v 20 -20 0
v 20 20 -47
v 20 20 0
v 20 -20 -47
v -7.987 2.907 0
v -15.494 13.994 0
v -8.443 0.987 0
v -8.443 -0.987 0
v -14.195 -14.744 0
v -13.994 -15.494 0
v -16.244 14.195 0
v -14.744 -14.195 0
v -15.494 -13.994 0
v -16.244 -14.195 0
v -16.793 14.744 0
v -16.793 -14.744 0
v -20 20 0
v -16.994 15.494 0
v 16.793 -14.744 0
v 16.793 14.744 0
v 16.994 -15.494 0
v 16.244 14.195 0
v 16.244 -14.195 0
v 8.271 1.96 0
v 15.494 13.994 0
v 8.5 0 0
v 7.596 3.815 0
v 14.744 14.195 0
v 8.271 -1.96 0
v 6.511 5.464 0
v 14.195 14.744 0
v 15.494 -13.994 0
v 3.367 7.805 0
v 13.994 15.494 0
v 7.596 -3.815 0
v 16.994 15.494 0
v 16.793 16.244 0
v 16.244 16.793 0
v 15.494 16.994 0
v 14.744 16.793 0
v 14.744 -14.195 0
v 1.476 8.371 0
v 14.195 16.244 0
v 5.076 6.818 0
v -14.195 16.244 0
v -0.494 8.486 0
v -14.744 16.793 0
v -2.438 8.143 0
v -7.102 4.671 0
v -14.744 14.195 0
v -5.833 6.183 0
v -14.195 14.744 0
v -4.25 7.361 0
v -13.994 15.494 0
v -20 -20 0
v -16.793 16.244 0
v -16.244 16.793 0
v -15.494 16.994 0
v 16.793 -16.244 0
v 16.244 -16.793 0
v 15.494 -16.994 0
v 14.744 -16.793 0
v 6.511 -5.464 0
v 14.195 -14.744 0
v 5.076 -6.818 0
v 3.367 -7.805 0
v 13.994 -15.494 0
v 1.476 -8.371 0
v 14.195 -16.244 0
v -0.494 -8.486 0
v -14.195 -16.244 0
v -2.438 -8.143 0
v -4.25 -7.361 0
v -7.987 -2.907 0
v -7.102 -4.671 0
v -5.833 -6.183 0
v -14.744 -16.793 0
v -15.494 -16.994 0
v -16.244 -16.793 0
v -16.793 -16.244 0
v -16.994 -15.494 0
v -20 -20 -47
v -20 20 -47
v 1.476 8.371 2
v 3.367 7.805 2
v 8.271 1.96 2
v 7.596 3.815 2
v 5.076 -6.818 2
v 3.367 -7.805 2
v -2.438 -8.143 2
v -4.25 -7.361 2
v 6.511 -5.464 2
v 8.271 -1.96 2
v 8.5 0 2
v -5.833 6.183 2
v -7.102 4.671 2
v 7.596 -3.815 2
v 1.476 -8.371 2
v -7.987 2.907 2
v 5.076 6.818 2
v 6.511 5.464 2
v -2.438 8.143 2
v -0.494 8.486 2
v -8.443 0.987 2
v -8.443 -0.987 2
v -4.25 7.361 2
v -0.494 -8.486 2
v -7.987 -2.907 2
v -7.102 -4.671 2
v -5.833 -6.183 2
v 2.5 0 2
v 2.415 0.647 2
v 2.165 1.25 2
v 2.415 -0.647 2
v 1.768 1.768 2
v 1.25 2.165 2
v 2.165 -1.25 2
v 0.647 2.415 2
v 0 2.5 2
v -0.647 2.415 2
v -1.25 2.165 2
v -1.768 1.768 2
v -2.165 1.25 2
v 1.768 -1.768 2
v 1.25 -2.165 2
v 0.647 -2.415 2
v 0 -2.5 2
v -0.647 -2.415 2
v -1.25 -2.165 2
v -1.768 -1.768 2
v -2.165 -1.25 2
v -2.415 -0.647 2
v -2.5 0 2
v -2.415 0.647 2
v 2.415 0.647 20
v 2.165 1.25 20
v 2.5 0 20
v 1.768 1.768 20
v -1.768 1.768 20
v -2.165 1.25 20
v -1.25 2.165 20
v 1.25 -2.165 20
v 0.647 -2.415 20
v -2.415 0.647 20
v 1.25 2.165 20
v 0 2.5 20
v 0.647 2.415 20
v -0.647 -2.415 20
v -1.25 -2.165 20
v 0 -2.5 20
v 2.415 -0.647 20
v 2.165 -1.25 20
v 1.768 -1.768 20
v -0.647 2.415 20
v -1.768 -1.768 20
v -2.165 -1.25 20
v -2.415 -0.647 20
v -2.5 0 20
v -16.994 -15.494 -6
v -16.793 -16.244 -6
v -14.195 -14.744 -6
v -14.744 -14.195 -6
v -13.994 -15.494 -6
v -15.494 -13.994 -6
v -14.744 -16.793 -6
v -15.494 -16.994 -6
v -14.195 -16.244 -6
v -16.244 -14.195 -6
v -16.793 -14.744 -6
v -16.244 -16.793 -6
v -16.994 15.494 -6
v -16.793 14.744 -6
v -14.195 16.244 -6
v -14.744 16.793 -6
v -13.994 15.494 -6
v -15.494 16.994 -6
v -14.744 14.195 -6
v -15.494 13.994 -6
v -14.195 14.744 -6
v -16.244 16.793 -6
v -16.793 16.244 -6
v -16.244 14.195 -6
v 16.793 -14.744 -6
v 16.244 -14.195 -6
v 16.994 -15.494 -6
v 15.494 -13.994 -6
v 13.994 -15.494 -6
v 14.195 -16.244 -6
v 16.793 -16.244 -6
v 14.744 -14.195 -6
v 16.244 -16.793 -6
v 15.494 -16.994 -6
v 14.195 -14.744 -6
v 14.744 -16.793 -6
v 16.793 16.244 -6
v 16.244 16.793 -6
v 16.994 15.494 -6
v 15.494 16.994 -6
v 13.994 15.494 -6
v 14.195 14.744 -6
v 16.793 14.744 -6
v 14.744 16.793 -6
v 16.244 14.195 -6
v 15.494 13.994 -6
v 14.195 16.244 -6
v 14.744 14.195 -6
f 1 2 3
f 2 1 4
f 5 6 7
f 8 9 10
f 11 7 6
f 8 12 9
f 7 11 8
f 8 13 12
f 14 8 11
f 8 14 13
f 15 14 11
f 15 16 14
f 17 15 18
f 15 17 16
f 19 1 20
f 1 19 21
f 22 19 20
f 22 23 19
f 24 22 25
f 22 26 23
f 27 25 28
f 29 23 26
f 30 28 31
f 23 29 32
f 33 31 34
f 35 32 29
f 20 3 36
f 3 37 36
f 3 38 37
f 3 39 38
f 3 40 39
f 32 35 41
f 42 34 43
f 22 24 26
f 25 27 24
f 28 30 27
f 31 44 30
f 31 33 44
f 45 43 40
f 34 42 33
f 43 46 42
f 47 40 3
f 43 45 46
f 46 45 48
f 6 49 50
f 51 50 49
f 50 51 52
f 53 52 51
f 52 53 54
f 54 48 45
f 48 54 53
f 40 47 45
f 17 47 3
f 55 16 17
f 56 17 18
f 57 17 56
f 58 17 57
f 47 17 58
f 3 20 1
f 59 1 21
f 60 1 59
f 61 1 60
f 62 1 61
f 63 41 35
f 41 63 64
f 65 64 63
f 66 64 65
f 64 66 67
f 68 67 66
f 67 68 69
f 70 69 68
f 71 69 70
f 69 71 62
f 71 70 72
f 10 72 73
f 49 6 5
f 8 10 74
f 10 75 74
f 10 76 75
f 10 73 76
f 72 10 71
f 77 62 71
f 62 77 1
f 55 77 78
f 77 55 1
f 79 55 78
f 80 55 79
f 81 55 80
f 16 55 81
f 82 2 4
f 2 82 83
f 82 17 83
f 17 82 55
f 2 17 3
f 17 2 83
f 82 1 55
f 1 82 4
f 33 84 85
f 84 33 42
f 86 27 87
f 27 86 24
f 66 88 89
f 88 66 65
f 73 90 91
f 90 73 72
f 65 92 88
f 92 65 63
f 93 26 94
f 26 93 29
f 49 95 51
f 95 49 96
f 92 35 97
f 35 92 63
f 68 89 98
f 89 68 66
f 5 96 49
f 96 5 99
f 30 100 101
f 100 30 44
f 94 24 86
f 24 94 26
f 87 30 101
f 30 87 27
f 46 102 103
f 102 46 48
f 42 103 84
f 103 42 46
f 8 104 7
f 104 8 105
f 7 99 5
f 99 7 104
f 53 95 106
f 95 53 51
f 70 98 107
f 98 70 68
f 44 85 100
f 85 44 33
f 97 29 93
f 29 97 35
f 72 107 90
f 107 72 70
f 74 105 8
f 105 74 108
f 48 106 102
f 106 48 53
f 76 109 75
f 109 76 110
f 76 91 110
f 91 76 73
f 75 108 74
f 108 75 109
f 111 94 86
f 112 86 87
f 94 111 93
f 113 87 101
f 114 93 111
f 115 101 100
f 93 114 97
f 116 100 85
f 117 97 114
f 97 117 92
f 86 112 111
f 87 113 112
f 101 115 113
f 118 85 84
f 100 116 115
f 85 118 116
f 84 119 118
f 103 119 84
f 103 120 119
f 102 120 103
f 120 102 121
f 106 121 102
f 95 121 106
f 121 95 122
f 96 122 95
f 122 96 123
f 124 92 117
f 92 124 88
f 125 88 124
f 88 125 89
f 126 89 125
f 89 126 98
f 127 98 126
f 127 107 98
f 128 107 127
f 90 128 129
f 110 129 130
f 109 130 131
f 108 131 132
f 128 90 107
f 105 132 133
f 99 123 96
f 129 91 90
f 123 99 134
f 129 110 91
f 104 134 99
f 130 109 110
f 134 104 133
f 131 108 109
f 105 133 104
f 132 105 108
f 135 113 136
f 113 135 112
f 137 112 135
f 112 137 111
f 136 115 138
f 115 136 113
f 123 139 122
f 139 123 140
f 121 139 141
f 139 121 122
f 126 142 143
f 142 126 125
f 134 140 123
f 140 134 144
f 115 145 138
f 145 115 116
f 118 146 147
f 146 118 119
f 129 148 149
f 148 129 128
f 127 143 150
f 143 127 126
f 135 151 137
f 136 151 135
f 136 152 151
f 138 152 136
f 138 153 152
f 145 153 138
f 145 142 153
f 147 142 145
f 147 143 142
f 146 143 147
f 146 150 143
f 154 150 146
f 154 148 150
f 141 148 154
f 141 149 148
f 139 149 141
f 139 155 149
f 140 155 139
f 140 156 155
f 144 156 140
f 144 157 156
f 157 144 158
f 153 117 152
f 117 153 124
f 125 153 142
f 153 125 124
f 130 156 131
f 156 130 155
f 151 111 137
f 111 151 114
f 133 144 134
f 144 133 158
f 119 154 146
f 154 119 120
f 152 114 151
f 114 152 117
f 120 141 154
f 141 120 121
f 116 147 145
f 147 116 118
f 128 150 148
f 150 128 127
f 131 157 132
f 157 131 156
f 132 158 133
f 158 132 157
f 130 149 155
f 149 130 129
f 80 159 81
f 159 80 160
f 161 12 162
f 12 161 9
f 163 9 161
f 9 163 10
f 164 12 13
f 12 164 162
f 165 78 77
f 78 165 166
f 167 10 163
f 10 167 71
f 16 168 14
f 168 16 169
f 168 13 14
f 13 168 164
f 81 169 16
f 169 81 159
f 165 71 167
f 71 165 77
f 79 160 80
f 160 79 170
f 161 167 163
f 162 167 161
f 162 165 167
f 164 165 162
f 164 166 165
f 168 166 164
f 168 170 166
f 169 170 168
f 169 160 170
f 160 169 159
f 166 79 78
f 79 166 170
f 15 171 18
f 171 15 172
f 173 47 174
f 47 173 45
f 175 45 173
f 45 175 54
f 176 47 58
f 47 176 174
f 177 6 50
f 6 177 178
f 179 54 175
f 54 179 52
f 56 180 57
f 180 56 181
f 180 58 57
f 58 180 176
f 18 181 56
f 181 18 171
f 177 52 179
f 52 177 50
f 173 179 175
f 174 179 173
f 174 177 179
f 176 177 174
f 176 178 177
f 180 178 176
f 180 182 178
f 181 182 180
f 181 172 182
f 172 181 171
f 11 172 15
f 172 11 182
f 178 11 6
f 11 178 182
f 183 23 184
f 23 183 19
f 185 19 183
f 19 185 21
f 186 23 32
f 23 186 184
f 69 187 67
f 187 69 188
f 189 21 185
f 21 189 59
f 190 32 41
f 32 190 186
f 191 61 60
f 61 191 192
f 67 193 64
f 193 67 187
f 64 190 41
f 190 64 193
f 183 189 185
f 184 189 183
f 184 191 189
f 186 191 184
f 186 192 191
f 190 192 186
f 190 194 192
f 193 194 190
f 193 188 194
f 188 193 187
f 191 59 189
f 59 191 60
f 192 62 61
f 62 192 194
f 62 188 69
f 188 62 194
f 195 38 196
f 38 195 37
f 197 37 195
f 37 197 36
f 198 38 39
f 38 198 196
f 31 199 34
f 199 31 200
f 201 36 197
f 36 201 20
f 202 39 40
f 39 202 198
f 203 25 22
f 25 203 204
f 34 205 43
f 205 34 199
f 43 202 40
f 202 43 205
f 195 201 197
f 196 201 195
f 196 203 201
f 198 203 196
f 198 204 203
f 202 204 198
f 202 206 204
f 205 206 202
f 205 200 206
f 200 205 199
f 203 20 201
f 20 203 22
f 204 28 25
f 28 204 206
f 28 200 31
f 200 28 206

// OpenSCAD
// file: configuration.scad
//
//	configuration.scad
//
//	General configuration settings.
//
//	Because this file is intended to be somewhat interchangable with 
//		configuration.scad from prusajr's github repository, there is 
//		more configuration in "moreConfiguration.scad".
//
// Edit variant to match the types of nuts and bolts you want to use in your part.
//
//	Edit layer_height to be greater than the height of one printed layer, 
//		but less than the height of two printed layers.
//


metric = 0;	// All parts are metric - use both M3 and M4 bolts.
sae = 1;		// All parts are SAE - use only #6/32 bolts.
m3only = 2;	// All parts are metric, but use only M3 bolts.
hybrid = 3;	// Mix of metric and SAE - use M3 and 6/32 bolts.

variant = metric;

layer_height = .25;

nut_slop = .2;		// I aim for a "interference fit" for nuts - a bit of force required to place the nut.

bolt_slop = .6;	// The aim here is to just barely allow the bolt to fit through the hole, without having to thread it in.

_actual_m3_diameter = 3+bolt_slop;
_actual_m4_diameter = 4+bolt_slop;
_actual_6_32_diameter = 3.4+bolt_slop;

_actual_m3_nut_diameter = 5.5/cos(30)+nut_slop;
_actual_m4_nut_diameter = 6.87/cos(30)+nut_slop;
_actual_m5_nut_diameter = 7.85/cos(30)+nut_slop;
_actual_6_32_nut_diameter = 7.85/cos(30)+nut_slop;

_m3_diameters = [_actual_m3_diameter, _actual_6_32_diameter, _actual_m3_diameter, _actual_m3_diameter];
_m3_nut_diameters = [_actual_m3_nut_diameter, _actual_6_32_nut_diameter, _actual_m3_nut_diameter, _actual_m3_nut_diameter];

_m4_diameters = [_actual_m4_diameter, _actual_6_32_diameter, _actual_m3_diameter, _actual_6_32_diameter];
_m4_nut_diameters = [_actual_m4_nut_diameter, _actual_6_32_nut_diameter, _actual_m3_nut_diameter, _actual_6_32_nut_diameter];

m3_diameter = _m3_diameters[variant];
m3_nut_diameter = _m3_nut_diameters[variant];

m4_diameter = _m4_diameters[variant];
m4_nut_diameter = _m4_nut_diameters[variant];

m5_diameter = 5+bolt_slop;
m5_nut_diameter = 7.85/cos(30)+nut_slop;
m5_bolt_head_height = 4;

m6_diameter = 6+bolt_slop;
m6_nut_diameter = 10/cos(30)+nut_slop;
m6_bolt_head_height = 4;

m8_diameter = 8;

m8_nut_diameter = 12.8/cos(30)+nut_slop;
m8_nut_thickness = 7.7;
m8_bolt_head_height = 6;
m8_half_nut_height = 3.85;

threaded_rod_diameter = 8.7;
smooth_rod_diameter = 8.25;
// file: more_configuration.scad
//
// moreConfiguration.scad
//
//	General configuration settings that didn't exist in prusajr's configuration.scad
//
//	These settings are here, rather than in configuration.scad, in
//		order to keep configuration.scad interchangable with prusajr.s version.
//
// Edit extrusion_width to be greater than the width of one shell, but less than the width of two shells.

include <configuration.scad>

extrusion_width = .6;

vertical_slop = .6;
horizontal_slop = .3;

_actual_m3_nut_thickness = 2.5;
_actual_m4_nut_thickness = 3.5;
_actual_6_32_nut_thickness = 3.25;

_m3_nut_thickness = [_actual_m3_nut_thickness, _actual_6_32_nut_thickness, _actual_m3_nut_thickness, _actual_m3_nut_thickness];

_m4_nut_thickness = [_actual_m4_nut_thickness, _actual_6_32_nut_thickness, _actual_m3_nut_thickness, _actual_6_32_nut_thickness];

m3_nut_thickness = _m3_nut_thickness[variant];
m3_washer_diameter = 7.5;

m4_nut_thickness = _m4_nut_thickness[variant];

m3_bolt_head_height = 3;
m3_bolt_head_diameter = 6+horizontal_slop;

m4_bolt_head_height = 4;
m4_bolt_head_diameter = 7+horizontal_slop;

// Don't edit things after here.

x = 0;
y = 1;
z = 2;

bearing_length = 0;
bearing_body_diameter = 1;
bearing_flange_diameter = 2;
bearing_flange_width = 3;
bearing_rod_diameter = 4;

624_bearing = [5, 13, 13, 0, 4];
624_bearing_clearance = [0.4, 0.4, 0.4, 0, 2];

608_bearing = [7, 22, 22, 0, 8];
608_bearing_clearance = [0.4, 0.4, 0.4, 0, 2];

115_bearing = [4, 11, 11, 0, 5];
115_bearing_clearance = [0.4, 0.4, 0.4, 0, 3];

106_bearing = [3, 10, 10, 0, 6];
106_bearing_clearance = [0.4, 0.4, 0.4, 0, 0];

126_bearing = [4, 12, 12, 0, 6];
126_bearing_clearance = [0.4, 0.4, 0.4, 0, 3];

128_bearing = [3.5, 12, 12, 0, 8];
128_bearing_clearance = [0.4, 0.4, 0.4, 4];

lm8uu = [24, 15, 15, 0, 8];
lm8uu_clearance = [0.7, 0.7, 0.7, 0, 0];

igus = [10, 10, 15, 1, 8];
igus_clearance = [0.4, 0.4, 0.4, 0.4, 0];

part_color_1 = [1, .9, 0];
part_color_2 = [.9, 1, 0];

wood_color_1 = [111/256, 78/256, 55/256];
wood_color_2 = wood_color_1+[.2, .2, .2];
wood_color_3 = wood_color_1-[.2, .2, .2];

nema17_hole_spacing = 1.25*25.4;

ramps_size = [102, 60];

ramps_mounts = [[-35.76, -20.86],
                [-35.76, 27.4],
                [39.17, 27.4],
                [45.52, -20.86]];

//echo(ramps_mounts);
// main file
include <more_configuration.scad>

motor_size = [40, 40, 47];
hub_height = 2;
hub_radius = 17/2;
shaft_radius = 5/2;
shaft_length = 20;

function motor_bolt_hole_spacing() = 1.22*25.4;

motor_bolt_hole_length = 6;

module motor()
{
	difference()
	{
		union()
		{
			translate([0, 0, -motor_size[2]/2])
			cube(motor_size, center=true);

			translate([0, 0, hub_height/2-.05])
			cylinder(h=hub_height+.1, r=hub_radius, center=true);

			translate([0, 0, shaft_length/2])
			cylinder(h=shaft_length, r=shaft_radius, $fn=24, center=true);
		}

		for(i=[-1, 1]) for (j=[-1, 1])
			translate([i*motor_bolt_hole_spacing()/2, j*motor_bolt_hole_spacing()/2, -motor_bolt_hole_length/2+.05])
			cylinder(h=motor_bolt_hole_length+.1, r=3/2, $fn=12, center=true);
	}
}

motor();
